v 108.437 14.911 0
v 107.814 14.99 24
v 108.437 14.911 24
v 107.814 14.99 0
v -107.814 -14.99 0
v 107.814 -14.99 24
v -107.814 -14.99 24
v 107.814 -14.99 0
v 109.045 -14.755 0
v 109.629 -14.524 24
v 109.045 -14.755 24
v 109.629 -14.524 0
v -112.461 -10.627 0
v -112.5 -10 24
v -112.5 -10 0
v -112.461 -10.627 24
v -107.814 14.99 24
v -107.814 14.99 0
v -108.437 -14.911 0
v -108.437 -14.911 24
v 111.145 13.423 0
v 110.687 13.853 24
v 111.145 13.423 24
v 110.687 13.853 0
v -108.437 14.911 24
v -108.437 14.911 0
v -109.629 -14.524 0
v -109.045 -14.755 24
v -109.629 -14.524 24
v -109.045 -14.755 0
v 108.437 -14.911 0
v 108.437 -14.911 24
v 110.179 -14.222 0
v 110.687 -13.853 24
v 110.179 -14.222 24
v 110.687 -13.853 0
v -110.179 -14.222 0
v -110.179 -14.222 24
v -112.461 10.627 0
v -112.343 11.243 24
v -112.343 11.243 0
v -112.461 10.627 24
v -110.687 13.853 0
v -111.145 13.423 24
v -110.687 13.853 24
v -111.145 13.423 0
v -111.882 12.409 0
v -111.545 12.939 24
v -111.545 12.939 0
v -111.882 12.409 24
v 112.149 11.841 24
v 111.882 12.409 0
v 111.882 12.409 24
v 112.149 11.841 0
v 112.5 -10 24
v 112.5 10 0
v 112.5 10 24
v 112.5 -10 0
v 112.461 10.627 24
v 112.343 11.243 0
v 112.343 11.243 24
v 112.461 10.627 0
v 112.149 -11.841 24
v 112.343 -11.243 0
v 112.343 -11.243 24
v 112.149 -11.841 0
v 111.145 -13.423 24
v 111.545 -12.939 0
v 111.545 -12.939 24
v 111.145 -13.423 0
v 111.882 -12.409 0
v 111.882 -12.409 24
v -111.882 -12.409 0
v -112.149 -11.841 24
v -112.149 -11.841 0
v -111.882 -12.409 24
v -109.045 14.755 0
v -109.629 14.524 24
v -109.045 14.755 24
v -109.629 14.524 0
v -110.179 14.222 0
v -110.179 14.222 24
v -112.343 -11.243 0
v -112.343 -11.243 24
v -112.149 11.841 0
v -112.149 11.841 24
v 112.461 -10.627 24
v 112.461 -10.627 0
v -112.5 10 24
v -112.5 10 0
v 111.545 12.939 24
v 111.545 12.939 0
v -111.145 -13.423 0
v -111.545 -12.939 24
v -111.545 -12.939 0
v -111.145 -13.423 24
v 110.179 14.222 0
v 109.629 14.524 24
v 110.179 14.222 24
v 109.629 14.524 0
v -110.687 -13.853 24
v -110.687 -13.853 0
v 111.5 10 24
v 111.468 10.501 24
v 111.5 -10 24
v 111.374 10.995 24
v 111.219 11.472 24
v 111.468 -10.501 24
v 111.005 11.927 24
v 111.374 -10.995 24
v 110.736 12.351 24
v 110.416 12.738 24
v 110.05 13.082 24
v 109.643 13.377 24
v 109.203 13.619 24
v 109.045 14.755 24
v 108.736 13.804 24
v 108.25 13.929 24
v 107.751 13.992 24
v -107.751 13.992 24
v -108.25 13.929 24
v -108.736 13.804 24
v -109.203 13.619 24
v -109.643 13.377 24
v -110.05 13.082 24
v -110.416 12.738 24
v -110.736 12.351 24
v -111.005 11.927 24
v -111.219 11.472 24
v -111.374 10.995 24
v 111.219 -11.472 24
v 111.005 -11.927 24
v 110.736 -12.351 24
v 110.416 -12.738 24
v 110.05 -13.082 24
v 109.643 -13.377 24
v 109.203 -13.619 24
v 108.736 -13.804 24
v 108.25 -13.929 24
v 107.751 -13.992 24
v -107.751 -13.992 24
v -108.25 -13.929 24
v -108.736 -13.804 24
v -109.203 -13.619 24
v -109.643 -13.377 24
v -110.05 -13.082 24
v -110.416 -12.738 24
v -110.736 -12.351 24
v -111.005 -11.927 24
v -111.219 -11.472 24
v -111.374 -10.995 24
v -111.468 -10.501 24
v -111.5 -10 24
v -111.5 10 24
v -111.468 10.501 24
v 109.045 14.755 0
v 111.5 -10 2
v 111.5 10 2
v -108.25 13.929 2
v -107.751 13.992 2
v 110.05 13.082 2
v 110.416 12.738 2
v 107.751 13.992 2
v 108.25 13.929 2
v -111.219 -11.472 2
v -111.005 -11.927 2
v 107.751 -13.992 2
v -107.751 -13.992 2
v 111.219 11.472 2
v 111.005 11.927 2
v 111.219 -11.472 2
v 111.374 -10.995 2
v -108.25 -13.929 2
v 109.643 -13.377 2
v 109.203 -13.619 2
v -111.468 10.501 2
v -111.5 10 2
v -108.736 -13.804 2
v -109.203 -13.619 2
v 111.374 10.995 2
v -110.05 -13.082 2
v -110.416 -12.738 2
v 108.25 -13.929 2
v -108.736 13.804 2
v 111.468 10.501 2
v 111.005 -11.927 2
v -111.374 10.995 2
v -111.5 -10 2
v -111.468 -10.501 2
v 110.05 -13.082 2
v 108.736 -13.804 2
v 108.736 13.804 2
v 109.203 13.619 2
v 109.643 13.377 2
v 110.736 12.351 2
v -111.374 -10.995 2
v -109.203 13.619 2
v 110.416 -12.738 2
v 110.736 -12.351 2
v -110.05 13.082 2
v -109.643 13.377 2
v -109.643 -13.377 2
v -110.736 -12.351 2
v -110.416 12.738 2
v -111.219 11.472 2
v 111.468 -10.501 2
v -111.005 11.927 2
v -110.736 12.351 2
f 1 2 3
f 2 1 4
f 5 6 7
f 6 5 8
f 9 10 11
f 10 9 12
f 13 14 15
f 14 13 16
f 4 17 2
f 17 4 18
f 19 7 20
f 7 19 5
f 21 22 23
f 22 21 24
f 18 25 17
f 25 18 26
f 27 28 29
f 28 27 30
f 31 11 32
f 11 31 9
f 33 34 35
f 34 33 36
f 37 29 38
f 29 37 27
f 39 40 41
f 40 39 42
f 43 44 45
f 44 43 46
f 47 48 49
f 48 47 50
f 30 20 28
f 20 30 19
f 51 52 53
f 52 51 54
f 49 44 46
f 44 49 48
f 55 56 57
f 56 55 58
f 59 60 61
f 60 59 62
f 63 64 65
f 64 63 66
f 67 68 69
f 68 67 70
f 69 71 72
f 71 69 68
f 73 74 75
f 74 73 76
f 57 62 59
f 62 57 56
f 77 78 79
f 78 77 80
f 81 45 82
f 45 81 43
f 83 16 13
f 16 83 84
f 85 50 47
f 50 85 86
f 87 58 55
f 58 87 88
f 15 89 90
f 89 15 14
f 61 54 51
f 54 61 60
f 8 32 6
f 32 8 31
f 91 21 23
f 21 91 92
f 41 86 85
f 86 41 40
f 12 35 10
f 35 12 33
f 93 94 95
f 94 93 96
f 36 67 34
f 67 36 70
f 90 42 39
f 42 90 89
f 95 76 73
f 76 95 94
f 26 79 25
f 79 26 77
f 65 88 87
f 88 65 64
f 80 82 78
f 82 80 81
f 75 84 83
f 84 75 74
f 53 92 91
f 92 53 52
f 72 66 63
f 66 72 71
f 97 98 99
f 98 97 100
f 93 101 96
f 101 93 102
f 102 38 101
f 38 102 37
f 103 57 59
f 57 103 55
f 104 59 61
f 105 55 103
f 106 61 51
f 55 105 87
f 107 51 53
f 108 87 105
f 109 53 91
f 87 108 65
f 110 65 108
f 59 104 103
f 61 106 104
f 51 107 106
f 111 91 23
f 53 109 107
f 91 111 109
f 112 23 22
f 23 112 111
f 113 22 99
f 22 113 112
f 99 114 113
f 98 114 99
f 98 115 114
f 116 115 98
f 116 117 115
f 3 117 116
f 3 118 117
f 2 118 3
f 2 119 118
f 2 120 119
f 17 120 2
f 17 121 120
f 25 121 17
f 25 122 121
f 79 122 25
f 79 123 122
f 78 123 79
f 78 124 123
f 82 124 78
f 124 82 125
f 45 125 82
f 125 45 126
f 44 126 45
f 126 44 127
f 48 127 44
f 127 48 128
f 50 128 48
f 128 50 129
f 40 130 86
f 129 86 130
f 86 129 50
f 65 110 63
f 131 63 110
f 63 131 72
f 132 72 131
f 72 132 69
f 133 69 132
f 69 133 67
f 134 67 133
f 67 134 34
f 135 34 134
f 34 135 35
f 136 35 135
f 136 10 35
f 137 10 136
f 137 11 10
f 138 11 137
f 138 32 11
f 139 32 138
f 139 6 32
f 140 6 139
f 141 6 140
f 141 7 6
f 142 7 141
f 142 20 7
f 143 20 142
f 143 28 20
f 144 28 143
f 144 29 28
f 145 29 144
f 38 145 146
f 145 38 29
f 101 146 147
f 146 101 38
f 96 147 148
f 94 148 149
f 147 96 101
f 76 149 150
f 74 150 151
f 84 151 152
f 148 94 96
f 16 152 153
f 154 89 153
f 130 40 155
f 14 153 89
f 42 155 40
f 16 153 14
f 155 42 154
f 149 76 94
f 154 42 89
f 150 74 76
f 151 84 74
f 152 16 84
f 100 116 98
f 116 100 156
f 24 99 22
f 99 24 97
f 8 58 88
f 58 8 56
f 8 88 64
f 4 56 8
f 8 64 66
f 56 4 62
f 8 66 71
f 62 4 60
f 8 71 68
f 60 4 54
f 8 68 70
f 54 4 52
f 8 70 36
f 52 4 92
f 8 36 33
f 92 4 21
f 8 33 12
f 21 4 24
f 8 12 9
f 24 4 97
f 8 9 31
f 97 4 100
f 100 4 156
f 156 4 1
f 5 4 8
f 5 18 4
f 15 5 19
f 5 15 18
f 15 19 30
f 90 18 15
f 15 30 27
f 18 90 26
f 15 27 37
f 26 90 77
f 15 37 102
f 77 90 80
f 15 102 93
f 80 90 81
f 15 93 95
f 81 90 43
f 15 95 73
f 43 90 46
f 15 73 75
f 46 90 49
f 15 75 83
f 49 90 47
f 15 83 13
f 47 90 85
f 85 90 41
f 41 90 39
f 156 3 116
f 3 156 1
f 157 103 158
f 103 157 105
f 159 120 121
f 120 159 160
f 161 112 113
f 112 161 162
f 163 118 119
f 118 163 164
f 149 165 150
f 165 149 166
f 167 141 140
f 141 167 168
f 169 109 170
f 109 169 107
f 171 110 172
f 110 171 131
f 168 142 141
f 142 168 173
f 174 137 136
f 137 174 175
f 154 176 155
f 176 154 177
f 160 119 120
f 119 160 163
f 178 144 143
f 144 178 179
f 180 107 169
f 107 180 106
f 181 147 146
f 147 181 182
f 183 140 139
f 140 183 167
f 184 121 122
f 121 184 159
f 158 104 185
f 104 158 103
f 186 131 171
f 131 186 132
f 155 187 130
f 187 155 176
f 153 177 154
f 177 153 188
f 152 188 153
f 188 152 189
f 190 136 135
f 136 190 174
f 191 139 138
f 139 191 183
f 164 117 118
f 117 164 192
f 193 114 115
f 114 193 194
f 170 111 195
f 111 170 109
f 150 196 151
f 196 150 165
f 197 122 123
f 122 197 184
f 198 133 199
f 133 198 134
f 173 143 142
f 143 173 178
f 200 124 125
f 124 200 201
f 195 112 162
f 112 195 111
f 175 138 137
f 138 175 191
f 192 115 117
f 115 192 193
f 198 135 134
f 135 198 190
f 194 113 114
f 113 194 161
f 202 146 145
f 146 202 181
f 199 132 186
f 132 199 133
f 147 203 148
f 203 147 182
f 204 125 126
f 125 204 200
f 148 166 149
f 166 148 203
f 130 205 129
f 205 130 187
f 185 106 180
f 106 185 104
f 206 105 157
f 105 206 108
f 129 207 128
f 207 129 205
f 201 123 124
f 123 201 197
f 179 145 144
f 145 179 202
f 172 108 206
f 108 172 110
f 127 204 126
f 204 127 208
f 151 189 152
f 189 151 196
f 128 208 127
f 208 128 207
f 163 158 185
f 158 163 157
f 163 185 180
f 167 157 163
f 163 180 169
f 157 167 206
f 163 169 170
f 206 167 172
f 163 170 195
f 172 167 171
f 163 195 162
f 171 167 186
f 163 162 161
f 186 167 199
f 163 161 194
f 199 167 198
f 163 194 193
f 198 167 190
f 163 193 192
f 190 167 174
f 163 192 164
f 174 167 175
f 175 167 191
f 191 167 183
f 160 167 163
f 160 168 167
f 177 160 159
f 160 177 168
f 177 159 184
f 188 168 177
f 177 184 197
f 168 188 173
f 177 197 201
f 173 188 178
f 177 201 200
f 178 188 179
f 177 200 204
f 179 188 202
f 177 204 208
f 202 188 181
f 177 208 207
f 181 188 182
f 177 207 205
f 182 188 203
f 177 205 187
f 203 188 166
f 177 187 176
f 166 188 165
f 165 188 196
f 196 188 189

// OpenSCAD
$fn = 50;


difference() {
	union() {
		hull() {
			translate(v = [-107.5000000000, 10.0000000000, 0]) {
				cylinder(h = 24, r = 5);
			}
			translate(v = [107.5000000000, 10.0000000000, 0]) {
				cylinder(h = 24, r = 5);
			}
			translate(v = [-107.5000000000, -10.0000000000, 0]) {
				cylinder(h = 24, r = 5);
			}
			translate(v = [107.5000000000, -10.0000000000, 0]) {
				cylinder(h = 24, r = 5);
			}
		}
	}
	union() {
		translate(v = [0, 0, 2]) {
			hull() {
				translate(v = [-107.5000000000, 10.0000000000, 0]) {
					cylinder(h = 22, r = 4);
				}
				translate(v = [107.5000000000, 10.0000000000, 0]) {
					cylinder(h = 22, r = 4);
				}
				translate(v = [-107.5000000000, -10.0000000000, 0]) {
					cylinder(h = 22, r = 4);
				}
				translate(v = [107.5000000000, -10.0000000000, 0]) {
					cylinder(h = 22, r = 4);
				}
			}
		}
	}
}
